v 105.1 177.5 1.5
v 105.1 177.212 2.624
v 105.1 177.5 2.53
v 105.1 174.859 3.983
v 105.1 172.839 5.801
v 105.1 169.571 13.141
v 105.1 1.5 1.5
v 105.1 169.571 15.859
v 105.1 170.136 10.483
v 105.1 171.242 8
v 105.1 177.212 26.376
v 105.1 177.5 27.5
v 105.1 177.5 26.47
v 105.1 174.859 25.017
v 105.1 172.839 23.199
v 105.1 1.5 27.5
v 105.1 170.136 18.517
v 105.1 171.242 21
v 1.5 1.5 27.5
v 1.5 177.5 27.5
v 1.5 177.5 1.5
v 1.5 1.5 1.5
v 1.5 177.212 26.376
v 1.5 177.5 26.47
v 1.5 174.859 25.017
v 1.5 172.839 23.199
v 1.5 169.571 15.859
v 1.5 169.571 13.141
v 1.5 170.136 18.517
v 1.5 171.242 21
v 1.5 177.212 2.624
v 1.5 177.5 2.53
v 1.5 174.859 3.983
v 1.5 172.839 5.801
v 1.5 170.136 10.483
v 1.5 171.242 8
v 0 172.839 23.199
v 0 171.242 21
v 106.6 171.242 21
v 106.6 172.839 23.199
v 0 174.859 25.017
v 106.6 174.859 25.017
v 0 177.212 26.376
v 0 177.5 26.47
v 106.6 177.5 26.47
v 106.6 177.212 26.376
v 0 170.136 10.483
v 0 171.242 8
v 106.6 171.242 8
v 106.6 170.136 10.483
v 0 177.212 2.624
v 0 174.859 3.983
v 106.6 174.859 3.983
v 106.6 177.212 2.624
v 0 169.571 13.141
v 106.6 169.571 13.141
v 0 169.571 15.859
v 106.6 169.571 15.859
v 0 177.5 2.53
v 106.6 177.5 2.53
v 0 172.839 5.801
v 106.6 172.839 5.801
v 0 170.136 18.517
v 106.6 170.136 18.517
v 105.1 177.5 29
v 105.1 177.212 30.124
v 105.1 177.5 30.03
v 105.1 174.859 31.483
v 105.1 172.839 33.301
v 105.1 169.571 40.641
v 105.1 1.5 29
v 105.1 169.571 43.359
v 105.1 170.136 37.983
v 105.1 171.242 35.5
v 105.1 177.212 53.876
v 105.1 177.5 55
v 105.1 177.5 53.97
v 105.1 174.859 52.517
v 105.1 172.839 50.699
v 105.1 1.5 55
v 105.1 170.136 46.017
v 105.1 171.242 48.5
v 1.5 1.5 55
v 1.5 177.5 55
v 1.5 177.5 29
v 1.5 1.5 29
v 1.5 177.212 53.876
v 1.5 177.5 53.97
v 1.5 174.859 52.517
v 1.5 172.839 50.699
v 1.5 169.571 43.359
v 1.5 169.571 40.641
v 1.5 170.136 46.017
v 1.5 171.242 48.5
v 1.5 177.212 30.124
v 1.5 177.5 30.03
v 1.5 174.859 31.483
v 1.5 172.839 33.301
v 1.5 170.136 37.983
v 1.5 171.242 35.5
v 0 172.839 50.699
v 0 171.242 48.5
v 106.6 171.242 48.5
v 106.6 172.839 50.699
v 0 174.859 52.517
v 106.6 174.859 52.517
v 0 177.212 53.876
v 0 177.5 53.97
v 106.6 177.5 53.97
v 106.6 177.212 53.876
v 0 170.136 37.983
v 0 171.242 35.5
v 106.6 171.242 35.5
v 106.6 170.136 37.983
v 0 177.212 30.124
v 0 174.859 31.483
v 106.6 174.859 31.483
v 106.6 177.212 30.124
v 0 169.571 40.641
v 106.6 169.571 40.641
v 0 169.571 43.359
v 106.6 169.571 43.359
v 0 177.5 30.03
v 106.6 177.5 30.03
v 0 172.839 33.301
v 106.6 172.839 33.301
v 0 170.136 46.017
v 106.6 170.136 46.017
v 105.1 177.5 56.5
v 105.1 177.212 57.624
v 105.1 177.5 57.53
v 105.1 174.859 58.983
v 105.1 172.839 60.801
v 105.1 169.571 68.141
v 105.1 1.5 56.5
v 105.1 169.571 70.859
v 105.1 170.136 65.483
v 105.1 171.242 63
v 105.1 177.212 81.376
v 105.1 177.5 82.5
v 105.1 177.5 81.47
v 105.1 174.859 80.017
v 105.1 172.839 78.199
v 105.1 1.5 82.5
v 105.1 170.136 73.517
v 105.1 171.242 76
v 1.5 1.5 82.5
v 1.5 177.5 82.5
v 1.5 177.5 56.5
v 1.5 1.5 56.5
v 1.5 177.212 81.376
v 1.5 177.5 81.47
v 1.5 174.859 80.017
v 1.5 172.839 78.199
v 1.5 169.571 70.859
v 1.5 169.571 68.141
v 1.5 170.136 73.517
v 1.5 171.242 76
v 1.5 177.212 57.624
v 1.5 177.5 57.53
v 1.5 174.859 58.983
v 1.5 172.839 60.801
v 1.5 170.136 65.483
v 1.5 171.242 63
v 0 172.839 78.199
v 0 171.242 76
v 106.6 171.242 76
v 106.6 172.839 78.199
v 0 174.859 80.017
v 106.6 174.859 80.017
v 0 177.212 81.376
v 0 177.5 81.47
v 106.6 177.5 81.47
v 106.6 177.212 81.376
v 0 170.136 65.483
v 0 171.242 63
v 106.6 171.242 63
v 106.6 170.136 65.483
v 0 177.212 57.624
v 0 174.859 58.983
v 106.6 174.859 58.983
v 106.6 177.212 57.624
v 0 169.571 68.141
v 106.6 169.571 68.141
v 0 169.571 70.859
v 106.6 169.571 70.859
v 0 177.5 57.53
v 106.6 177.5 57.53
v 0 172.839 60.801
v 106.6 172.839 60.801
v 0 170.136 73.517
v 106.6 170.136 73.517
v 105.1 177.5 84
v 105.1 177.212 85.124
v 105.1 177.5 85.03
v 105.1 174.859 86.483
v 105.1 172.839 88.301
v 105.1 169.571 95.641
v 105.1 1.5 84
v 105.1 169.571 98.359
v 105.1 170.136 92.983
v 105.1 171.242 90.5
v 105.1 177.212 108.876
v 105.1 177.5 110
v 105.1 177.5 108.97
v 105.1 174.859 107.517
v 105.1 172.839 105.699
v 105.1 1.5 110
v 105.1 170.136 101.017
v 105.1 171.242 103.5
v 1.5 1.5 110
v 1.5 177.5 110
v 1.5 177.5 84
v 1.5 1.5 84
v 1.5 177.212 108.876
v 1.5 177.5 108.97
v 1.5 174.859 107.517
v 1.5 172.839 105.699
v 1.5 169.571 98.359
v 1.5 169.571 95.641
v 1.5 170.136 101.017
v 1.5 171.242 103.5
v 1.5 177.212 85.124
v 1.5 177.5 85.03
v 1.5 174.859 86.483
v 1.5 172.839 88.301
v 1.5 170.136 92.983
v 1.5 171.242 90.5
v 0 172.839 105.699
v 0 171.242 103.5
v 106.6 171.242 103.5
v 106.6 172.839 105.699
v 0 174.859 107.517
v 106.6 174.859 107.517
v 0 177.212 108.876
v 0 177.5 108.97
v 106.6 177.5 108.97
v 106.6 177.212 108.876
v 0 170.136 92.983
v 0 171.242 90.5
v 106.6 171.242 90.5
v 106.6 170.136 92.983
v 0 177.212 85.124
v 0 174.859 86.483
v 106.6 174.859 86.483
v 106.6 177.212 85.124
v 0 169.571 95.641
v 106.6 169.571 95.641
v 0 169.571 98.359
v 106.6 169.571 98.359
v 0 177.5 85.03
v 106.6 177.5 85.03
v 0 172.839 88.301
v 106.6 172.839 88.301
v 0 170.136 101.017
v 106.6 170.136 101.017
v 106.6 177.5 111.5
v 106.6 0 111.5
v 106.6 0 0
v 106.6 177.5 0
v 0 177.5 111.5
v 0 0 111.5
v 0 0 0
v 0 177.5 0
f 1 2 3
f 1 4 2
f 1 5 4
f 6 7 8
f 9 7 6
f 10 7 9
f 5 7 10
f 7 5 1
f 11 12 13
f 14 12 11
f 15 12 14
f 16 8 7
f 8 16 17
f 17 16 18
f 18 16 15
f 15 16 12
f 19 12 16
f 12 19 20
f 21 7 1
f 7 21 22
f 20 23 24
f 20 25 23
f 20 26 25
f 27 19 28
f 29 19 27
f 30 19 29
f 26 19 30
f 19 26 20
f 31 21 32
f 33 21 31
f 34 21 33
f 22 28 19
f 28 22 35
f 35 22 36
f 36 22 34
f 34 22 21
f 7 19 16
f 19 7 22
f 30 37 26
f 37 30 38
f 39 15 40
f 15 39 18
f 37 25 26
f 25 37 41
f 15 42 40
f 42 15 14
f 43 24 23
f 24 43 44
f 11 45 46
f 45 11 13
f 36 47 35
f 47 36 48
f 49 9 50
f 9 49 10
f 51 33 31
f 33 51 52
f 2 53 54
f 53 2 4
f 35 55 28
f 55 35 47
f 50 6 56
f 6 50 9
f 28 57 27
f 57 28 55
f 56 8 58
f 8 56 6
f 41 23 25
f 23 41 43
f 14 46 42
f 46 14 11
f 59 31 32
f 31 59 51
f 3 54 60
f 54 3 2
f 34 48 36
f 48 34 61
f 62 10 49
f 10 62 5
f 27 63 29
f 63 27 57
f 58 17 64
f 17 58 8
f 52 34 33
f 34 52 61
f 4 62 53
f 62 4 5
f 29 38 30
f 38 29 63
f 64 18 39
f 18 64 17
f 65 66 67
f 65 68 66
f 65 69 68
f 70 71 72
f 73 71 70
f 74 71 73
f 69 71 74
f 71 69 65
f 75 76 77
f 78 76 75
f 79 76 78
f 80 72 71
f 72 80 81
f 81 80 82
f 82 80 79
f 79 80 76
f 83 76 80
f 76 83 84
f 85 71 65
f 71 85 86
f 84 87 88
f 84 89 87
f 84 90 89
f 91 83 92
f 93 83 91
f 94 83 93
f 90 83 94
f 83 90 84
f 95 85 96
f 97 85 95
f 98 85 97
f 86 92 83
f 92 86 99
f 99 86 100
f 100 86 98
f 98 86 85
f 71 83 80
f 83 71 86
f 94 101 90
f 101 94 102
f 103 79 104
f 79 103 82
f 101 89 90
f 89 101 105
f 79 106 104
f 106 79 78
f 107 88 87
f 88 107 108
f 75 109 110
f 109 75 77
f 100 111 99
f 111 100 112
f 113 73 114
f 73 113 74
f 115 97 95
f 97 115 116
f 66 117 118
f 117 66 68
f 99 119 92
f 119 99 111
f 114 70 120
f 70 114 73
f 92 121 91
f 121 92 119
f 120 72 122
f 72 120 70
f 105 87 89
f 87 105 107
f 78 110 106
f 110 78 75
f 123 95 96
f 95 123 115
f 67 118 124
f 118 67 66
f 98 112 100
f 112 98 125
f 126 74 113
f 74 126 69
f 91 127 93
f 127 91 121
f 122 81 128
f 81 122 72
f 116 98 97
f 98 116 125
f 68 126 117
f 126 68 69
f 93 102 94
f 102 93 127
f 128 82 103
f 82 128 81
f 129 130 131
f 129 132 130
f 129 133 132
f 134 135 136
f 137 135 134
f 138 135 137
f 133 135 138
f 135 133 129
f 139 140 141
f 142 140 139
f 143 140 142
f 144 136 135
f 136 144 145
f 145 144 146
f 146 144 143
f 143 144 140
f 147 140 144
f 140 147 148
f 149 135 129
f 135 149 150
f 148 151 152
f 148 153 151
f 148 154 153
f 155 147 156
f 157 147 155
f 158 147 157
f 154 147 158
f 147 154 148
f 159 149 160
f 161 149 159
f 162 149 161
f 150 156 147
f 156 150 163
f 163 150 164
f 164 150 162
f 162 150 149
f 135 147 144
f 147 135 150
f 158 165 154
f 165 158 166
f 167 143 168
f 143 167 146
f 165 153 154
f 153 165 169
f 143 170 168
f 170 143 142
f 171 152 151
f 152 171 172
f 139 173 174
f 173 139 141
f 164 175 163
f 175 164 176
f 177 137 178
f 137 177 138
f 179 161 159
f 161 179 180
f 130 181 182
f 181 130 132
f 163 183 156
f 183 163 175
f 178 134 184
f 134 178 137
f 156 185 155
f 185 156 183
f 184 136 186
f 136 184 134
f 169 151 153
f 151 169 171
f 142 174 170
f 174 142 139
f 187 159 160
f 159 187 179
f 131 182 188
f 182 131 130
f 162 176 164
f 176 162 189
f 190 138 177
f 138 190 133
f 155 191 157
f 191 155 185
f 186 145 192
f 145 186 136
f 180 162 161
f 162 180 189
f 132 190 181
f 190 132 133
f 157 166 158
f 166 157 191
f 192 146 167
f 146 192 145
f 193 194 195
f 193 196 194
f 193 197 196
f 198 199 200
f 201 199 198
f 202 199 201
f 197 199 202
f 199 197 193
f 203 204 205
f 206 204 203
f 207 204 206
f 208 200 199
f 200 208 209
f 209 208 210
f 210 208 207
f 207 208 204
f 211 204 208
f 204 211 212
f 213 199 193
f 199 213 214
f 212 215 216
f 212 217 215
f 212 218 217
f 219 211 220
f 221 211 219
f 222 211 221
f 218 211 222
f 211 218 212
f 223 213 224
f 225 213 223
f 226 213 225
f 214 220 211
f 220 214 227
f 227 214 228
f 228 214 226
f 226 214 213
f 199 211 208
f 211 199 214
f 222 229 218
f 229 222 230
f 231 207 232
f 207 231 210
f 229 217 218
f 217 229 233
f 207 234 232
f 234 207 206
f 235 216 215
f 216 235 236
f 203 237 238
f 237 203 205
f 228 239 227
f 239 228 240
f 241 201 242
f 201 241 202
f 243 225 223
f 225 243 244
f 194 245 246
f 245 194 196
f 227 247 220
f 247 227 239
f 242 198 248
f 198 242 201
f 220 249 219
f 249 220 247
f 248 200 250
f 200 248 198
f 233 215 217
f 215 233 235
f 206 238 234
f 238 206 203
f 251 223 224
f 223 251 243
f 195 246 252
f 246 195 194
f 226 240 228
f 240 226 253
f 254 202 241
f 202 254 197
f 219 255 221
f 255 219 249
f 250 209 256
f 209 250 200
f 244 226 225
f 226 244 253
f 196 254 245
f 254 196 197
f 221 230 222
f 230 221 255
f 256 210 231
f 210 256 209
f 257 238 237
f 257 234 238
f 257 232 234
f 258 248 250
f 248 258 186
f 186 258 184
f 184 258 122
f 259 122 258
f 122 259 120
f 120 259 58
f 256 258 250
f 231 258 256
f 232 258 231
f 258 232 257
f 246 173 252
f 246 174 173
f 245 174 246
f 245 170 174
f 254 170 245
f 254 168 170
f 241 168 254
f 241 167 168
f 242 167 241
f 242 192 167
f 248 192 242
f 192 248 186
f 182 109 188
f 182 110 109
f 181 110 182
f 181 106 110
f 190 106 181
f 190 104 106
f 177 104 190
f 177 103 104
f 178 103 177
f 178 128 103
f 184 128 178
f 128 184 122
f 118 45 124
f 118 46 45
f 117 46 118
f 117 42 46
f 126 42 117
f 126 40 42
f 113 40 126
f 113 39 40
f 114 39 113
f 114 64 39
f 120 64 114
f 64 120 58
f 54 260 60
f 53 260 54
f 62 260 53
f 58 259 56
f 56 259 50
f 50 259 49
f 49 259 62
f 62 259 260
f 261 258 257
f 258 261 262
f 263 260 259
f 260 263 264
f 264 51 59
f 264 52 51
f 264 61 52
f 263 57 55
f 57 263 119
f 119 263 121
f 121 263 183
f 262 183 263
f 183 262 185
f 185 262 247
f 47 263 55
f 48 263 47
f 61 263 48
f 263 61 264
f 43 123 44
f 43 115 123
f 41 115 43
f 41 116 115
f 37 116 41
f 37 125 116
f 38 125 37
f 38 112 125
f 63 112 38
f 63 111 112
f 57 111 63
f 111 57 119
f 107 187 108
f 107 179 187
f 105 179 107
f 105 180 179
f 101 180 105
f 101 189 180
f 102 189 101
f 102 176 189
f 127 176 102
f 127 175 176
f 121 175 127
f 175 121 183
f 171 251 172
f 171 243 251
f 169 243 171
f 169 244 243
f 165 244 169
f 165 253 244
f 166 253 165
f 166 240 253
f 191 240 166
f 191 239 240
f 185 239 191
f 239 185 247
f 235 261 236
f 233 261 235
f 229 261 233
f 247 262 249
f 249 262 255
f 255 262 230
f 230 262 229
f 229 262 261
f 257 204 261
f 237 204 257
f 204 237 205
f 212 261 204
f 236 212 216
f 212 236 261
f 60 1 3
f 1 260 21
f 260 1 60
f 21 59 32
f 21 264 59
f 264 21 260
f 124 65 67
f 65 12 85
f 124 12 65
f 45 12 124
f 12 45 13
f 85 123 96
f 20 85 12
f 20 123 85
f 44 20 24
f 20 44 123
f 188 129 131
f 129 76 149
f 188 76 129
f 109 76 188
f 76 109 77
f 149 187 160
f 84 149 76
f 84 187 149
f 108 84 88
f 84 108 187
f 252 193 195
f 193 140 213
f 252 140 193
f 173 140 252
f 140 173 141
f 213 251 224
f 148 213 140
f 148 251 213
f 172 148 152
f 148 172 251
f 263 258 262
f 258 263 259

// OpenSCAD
// Petite
int_x = 69.6+2;
int_z = 22.2+2;
int_y = 130+2;

// Grosse
int_x = 101.6+2;
int_z = 24.0+2;
int_y = 174+2;


wall = 1.5;

count = 4;

difference() {
	cube([int_x+wall*2, int_y+wall,int_z*4+wall*5]);

	for(b =[0:count-1]) {
		translate([wall,wall,wall+(wall+int_z)*b])
			cube([int_x,int_y+1,int_z]);
		translate([-1,int_y+wall+5,(int_z+wall)*b+int_z/2+wall])
			rotate([0,90,0])
				cylinder(int_x+wall*2+2, int_z/2, int_z/2);
	}

}

for(b =[0:count-1]) {
}
